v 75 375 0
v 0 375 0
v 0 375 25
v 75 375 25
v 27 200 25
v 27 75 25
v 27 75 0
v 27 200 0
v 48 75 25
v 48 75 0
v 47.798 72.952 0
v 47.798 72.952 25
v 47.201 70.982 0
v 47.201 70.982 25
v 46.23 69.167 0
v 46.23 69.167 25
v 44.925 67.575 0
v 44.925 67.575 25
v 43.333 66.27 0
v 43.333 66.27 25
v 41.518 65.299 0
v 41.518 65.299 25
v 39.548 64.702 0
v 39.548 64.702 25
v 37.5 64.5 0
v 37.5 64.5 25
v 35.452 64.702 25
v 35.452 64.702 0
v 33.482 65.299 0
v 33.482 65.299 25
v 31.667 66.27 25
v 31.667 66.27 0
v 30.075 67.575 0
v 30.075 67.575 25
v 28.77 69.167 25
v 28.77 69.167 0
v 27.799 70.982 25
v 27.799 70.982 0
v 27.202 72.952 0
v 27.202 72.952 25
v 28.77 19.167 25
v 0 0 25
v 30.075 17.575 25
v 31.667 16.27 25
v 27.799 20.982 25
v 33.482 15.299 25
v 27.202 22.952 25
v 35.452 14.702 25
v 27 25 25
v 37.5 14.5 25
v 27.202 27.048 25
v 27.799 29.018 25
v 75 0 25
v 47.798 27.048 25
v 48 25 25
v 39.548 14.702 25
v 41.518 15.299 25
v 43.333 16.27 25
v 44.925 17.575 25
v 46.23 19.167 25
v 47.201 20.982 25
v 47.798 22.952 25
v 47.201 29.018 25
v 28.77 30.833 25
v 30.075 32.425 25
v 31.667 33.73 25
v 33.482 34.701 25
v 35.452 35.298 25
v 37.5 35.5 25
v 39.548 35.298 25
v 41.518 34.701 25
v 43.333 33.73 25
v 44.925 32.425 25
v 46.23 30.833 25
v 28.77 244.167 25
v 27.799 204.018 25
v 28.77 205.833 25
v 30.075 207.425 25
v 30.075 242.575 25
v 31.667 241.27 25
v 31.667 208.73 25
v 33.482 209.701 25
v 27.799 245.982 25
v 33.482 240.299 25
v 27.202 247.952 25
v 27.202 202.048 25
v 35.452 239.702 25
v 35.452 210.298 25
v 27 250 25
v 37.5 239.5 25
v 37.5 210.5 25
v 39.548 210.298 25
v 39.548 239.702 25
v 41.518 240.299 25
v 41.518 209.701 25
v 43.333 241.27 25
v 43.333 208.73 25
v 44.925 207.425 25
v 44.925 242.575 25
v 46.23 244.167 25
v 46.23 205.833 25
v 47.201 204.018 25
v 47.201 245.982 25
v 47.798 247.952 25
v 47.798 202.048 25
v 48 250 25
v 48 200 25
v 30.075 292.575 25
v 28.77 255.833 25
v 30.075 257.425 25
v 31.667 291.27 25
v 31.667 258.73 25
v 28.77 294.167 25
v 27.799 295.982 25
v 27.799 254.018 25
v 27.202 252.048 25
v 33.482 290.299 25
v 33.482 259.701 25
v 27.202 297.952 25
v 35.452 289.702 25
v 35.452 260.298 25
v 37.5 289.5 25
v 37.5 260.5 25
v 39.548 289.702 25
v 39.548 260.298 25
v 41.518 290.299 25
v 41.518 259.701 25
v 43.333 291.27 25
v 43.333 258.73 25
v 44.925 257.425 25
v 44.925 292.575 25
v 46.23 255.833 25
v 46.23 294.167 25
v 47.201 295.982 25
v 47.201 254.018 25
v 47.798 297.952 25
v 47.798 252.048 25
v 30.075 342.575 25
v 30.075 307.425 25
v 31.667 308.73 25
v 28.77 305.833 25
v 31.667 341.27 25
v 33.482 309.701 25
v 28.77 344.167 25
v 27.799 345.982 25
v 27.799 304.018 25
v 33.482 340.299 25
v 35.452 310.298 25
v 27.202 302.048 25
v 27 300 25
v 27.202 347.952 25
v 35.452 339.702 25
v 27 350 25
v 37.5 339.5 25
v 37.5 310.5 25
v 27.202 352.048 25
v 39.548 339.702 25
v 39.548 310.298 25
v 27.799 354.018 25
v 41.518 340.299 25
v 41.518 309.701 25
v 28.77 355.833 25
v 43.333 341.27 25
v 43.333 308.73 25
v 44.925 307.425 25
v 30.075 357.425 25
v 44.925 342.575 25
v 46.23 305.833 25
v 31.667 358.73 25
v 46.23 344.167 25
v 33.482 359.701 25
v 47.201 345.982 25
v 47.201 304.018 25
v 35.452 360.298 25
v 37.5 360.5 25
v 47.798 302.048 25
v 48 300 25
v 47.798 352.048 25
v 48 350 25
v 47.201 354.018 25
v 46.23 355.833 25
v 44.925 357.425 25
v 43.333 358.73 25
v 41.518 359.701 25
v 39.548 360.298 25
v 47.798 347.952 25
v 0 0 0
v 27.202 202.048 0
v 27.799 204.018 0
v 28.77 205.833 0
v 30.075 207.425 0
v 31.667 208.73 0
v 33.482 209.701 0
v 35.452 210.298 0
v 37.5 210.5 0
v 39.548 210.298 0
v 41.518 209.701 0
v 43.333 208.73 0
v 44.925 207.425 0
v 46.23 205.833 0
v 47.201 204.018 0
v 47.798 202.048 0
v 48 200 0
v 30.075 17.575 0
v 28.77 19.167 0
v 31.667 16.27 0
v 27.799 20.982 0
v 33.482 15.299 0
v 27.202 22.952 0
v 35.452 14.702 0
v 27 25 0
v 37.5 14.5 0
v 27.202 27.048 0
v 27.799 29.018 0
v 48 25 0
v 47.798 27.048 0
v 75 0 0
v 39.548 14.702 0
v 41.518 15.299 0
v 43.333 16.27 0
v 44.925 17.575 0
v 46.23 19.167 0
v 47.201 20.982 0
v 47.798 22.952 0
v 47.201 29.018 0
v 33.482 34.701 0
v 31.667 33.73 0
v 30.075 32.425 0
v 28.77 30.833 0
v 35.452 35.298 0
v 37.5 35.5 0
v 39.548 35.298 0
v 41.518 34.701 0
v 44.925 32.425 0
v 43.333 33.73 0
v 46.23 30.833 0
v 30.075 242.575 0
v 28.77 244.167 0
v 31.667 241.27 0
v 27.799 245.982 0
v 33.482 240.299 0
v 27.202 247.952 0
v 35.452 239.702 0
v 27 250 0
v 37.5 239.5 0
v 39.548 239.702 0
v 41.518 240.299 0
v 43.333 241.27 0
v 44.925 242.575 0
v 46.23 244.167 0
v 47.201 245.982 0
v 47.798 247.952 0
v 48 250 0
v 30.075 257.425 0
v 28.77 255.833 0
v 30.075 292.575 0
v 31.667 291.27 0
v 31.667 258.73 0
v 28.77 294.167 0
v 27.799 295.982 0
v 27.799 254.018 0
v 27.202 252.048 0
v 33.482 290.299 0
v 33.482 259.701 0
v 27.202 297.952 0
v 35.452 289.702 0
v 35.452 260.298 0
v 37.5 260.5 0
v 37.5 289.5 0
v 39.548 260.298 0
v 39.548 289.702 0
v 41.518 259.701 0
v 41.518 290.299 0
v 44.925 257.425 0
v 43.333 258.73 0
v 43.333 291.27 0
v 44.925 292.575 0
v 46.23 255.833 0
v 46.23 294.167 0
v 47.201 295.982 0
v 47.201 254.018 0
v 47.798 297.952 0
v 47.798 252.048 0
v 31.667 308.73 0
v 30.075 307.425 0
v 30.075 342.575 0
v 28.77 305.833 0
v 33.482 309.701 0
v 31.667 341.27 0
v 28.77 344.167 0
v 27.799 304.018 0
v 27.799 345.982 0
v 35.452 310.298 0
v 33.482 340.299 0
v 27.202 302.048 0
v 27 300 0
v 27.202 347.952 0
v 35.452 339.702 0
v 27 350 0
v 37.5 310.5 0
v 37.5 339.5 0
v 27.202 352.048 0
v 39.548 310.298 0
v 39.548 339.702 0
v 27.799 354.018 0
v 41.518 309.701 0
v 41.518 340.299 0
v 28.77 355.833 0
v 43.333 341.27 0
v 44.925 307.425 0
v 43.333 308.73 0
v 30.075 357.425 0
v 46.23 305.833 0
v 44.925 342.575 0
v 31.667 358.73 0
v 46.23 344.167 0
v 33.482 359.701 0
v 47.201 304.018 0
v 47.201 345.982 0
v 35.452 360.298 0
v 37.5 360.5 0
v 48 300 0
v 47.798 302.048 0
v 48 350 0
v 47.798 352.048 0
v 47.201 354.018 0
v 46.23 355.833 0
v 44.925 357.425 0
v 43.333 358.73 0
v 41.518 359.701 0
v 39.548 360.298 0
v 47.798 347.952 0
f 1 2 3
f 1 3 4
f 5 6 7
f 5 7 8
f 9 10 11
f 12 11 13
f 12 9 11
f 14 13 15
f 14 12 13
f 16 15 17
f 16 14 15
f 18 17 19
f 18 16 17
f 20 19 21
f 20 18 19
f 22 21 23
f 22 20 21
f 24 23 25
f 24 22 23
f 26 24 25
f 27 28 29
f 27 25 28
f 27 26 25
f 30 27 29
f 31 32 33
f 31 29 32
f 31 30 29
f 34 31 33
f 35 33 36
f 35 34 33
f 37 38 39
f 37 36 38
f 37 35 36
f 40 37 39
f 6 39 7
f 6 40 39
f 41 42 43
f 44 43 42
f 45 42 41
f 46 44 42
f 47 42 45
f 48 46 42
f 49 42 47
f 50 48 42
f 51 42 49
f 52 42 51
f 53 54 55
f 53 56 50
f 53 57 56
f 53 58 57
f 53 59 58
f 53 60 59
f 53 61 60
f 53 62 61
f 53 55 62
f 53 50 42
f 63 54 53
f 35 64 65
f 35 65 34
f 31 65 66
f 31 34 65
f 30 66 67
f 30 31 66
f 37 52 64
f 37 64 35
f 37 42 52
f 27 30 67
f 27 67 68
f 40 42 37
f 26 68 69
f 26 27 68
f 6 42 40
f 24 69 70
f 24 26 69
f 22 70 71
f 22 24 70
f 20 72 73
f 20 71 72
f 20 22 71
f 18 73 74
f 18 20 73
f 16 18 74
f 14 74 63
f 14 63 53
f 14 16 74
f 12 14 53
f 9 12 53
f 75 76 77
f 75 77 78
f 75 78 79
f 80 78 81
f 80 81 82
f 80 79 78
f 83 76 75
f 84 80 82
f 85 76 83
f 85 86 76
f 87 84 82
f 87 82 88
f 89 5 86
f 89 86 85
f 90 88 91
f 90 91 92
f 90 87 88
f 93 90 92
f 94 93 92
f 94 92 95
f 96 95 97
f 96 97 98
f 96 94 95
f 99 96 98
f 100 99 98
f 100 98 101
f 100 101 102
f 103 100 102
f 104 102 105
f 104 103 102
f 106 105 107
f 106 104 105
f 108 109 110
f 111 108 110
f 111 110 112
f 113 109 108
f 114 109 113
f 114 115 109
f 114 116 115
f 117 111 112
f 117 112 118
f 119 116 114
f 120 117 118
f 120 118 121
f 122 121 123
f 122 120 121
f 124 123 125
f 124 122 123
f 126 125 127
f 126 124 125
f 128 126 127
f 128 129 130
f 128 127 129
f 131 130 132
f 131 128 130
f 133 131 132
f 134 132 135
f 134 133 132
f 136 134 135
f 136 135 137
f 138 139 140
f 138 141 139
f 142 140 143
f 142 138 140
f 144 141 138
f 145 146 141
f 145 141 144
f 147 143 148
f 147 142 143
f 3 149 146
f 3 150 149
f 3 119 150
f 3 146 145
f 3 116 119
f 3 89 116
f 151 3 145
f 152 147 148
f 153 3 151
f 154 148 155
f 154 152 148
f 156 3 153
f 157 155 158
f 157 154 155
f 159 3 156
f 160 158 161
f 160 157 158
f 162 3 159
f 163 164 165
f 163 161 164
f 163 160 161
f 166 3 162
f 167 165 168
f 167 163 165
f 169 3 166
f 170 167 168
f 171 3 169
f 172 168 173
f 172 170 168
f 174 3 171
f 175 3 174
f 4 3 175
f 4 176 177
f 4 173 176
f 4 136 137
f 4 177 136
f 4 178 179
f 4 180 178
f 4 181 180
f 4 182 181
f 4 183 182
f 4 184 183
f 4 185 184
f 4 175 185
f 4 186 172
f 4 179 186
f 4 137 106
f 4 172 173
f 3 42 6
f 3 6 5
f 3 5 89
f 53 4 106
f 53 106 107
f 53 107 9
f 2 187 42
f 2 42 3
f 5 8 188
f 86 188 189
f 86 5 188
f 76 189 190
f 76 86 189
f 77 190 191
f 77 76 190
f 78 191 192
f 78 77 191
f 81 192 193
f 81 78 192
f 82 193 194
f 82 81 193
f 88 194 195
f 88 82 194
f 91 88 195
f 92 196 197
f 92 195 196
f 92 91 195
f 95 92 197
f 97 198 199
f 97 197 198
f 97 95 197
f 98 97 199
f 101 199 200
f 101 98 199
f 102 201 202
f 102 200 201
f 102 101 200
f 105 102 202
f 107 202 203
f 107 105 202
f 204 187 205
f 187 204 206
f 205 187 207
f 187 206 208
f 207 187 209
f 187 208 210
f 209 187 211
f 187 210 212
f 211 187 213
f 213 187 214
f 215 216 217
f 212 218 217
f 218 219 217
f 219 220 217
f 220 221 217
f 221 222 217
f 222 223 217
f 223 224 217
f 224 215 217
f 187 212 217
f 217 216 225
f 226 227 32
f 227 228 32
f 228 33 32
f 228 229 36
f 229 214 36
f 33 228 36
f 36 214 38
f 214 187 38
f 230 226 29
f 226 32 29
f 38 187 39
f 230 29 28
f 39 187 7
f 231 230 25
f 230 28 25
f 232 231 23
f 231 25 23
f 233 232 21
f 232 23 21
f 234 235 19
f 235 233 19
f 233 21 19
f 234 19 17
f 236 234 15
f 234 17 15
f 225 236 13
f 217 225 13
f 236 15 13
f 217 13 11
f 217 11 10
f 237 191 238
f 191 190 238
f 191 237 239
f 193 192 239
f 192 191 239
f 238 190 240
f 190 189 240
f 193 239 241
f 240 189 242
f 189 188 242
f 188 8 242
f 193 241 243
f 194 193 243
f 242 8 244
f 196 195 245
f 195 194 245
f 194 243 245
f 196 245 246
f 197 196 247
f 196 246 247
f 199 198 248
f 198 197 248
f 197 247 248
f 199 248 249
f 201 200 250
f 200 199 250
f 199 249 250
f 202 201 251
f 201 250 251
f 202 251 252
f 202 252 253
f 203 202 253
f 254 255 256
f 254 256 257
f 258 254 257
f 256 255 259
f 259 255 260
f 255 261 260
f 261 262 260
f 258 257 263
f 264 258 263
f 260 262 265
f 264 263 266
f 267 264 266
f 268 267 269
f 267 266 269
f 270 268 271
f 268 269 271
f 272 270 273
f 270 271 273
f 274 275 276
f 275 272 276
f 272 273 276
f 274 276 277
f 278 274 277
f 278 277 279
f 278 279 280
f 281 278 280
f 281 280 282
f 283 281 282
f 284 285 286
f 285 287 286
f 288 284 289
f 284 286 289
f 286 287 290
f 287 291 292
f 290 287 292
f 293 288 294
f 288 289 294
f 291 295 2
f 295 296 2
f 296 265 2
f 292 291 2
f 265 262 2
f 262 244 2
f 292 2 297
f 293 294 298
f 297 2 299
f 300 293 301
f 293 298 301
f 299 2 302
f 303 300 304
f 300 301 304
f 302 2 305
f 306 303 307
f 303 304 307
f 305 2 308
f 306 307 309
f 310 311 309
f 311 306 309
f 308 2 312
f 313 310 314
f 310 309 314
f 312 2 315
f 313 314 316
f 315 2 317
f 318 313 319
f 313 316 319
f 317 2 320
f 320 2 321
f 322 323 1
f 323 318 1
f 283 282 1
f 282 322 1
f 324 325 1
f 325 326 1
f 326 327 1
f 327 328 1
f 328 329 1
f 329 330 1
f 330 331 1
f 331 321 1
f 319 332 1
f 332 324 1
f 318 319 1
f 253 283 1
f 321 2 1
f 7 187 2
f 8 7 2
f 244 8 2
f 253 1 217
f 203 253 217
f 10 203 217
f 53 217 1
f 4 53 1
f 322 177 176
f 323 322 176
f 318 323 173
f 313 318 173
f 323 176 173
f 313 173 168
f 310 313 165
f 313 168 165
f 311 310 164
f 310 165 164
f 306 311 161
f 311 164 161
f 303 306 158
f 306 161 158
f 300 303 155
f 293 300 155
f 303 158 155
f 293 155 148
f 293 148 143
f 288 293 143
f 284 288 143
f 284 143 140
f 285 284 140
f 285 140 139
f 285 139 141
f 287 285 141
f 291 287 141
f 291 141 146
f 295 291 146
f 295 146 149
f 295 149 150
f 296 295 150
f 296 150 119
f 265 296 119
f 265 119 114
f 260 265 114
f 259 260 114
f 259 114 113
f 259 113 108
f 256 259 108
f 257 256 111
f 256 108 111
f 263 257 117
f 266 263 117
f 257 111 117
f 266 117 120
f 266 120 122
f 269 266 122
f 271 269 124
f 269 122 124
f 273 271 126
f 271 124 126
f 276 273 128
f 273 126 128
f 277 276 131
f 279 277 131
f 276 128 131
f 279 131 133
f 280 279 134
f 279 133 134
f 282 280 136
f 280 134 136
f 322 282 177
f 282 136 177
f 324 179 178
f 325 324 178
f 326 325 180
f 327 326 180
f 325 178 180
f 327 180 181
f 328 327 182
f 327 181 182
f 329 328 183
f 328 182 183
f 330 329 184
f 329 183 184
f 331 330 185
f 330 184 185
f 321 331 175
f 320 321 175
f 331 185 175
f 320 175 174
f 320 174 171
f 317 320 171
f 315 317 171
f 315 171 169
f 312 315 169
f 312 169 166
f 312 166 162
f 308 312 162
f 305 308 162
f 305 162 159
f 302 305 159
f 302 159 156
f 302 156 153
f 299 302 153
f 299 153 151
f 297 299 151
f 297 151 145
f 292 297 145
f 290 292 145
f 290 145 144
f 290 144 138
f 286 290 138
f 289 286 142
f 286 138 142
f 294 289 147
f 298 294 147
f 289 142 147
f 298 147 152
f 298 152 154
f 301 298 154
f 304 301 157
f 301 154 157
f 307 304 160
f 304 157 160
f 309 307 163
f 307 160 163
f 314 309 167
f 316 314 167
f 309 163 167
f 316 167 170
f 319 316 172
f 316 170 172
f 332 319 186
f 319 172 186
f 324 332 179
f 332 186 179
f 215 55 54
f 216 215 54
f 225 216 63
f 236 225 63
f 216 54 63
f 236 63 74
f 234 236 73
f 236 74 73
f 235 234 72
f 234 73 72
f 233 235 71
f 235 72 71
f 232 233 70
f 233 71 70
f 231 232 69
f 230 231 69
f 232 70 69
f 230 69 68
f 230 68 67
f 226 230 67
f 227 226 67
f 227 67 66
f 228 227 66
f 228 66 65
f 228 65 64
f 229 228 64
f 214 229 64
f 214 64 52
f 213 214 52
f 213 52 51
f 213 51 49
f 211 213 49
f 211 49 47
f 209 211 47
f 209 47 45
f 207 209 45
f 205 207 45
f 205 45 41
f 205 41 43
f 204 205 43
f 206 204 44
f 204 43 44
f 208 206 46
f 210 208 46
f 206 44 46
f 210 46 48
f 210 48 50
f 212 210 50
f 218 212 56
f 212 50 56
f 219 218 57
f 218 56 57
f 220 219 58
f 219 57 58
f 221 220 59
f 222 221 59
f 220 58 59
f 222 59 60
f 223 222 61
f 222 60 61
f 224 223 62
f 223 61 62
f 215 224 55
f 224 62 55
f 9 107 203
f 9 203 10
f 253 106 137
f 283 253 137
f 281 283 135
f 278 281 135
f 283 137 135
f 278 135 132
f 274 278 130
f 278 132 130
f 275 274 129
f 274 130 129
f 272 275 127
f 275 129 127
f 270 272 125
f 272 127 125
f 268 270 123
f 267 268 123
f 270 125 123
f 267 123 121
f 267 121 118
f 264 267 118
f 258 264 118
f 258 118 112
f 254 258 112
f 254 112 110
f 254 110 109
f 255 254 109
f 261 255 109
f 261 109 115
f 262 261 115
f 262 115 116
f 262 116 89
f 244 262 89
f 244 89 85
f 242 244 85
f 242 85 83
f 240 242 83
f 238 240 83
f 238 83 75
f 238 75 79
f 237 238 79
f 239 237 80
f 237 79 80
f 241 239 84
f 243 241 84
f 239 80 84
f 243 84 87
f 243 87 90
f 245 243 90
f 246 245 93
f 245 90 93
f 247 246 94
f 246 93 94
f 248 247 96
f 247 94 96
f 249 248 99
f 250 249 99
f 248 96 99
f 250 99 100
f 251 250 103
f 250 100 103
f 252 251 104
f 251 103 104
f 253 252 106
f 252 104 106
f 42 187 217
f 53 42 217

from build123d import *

# Parameters (mm, degrees)
SKETCH_1_W          = 75
SKETCH_1_H          = 375
EXTRUDE_1_DEPTH     = 25
SKETCH_2_R          = 10.5
CUT_EXTRUDE_1_DEPTH = 26


with BuildPart() as part:
    # Эскиз1 → Бобышка-Вытянуть1 (new body)
    with BuildSketch(Plane.XY):
        with Locations((37.5, 187.5)):
            Rectangle(SKETCH_1_W, SKETCH_1_H)
    extrude(amount=EXTRUDE_1_DEPTH)

    # Эскиз2 → Вырез-Вытянуть1 (cut, through all)
    with BuildSketch(Plane.XY.offset(25)):
        with Locations((37.5, 250)):
            Circle(SKETCH_2_R)
        with Locations((37.5, 300)):
            Circle(SKETCH_2_R)
        with Locations((37.5, 350)):
            Circle(SKETCH_2_R)
        with Locations((37.5, 25)):
            Circle(SKETCH_2_R)
        with BuildLine():
            Line((27, 75), (27, 200))
            ThreePointArc((27, 200), (37.5, 210.5), (48, 200))
            Line((48, 200), (48, 75))
            ThreePointArc((48, 75), (37.5, 64.5), (27, 75))
        make_face()
    extrude(amount=-CUT_EXTRUDE_1_DEPTH, mode=Mode.SUBTRACT)


solid = part.part
